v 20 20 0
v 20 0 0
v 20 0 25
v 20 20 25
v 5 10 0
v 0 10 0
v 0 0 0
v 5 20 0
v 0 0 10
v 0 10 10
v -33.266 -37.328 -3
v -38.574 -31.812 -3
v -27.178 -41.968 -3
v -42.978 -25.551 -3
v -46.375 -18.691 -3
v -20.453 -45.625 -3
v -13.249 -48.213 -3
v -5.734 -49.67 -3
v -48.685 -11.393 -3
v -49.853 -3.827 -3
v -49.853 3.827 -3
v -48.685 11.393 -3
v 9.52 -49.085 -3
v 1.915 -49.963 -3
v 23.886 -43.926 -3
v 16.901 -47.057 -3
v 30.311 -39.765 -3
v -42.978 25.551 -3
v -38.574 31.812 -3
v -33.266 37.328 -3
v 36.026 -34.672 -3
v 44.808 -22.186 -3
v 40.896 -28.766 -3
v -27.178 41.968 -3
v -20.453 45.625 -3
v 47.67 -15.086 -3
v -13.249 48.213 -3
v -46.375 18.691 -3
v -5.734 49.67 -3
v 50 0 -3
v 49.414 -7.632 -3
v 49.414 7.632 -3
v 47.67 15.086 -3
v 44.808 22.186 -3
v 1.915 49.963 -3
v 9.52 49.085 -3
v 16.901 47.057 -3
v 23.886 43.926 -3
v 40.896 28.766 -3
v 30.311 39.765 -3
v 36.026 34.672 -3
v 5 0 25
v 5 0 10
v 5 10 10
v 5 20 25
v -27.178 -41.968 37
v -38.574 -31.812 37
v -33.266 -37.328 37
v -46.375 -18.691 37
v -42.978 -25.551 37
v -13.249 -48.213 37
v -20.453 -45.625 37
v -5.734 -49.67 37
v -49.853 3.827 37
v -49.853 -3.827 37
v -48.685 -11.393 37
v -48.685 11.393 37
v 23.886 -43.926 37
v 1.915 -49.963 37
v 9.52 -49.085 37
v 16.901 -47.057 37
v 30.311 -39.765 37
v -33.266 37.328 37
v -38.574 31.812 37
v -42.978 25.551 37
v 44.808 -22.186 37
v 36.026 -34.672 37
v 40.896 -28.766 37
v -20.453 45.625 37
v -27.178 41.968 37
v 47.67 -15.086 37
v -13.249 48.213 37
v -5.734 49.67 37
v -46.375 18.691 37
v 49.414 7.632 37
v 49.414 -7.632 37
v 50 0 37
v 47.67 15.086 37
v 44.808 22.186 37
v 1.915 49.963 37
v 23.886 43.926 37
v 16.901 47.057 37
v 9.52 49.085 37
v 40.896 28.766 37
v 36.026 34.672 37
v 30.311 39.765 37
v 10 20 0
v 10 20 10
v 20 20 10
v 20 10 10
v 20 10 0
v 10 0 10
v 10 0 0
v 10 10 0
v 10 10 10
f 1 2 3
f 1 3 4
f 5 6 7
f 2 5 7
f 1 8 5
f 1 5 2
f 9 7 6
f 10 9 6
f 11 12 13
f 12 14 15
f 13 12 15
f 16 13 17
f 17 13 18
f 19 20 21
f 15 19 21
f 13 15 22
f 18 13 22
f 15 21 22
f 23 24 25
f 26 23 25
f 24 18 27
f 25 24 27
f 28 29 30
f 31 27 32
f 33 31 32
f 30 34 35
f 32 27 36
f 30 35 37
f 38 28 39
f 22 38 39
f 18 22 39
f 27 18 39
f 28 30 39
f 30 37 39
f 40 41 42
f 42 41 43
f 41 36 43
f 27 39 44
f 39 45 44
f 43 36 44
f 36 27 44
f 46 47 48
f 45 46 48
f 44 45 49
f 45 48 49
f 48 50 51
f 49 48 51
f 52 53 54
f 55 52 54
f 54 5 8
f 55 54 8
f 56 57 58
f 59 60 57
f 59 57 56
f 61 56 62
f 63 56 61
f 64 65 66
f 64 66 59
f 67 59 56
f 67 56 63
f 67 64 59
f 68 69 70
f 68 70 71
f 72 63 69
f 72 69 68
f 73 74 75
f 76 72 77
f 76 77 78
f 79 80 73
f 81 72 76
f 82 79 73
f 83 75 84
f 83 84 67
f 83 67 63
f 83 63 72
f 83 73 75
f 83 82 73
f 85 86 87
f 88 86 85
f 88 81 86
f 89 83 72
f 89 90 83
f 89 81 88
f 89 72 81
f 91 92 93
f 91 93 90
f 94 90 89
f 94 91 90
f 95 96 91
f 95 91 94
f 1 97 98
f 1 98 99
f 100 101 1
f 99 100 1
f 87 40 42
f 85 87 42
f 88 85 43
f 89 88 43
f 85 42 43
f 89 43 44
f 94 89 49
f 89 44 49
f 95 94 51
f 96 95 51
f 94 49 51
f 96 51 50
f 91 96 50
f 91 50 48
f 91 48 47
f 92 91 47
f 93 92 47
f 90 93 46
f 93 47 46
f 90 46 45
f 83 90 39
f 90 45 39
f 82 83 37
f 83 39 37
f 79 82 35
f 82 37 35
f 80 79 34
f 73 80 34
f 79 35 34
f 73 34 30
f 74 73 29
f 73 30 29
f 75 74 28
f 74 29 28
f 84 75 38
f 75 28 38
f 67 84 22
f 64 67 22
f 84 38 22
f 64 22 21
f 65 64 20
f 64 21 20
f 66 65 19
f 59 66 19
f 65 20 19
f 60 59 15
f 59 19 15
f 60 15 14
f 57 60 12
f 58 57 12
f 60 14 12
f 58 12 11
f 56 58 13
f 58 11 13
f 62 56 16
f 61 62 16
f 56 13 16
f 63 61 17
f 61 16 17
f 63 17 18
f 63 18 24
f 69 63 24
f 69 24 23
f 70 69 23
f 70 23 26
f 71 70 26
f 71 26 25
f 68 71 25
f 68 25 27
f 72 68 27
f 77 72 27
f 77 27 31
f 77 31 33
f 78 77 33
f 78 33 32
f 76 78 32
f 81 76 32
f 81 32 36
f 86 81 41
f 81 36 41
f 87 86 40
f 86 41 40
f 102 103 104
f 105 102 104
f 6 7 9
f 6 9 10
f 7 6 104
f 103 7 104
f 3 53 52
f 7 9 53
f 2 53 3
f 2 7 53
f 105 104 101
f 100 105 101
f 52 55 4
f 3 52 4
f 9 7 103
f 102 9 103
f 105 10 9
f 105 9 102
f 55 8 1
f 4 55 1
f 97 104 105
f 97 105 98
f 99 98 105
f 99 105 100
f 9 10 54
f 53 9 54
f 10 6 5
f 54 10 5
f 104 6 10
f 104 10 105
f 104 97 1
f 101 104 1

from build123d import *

# Parameters (mm, degrees)
BOX001_W       = 15
BOX001_H       = 20
BOX001_DEPTH   = 25
BOX_W          = 10
BOX_H          = 10
BOX_DEPTH      = 10
CYLINDER_R     = 50
CYLINDER_DEPTH = 40
BOX003_W       = 10
BOX003_H       = 10
BOX003_DEPTH   = 10
BOX002_W       = 10
BOX002_H       = 10
BOX002_DEPTH   = 10


with BuildPart() as cube001:
    # Box001 → Box001 (new body)
    with BuildSketch(Plane(origin=(5, 0, 0), x_dir=(1, 0, 0), z_dir=(0, 0, 1))):
        with Locations((7.5, 10)):
            Rectangle(BOX001_W, BOX001_H)
    extrude(amount=BOX001_DEPTH)


with BuildPart() as fusion:
    # Box → Box (new body)
    with BuildSketch(Plane.XY):
        with Locations((5, 5)):
            Rectangle(BOX_W, BOX_H)
    extrude(amount=BOX_DEPTH)

    # Fusion: union Cube001
    add(cube001.part)


with BuildPart() as cut:
    # Cylinder → Cylinder (new body)
    with BuildSketch(Plane.XY.offset(-3)):
        Circle(CYLINDER_R)
    extrude(amount=CYLINDER_DEPTH)

    # Cut: cut Fusion
    add(fusion.part, mode=Mode.SUBTRACT)


with BuildPart() as cube003:
    # Box003 → Box003 (new body)
    with BuildSketch(Plane(origin=(10, 10, 0), x_dir=(1, 0, 0), z_dir=(0, 0, 1))):
        with Locations((5, 5)):
            Rectangle(BOX003_W, BOX003_H)
    extrude(amount=BOX003_DEPTH)


with BuildPart() as fusion001:
    # Box002 → Box002 (new body)
    with BuildSketch(Plane.XY):
        with Locations((5, 5)):
            Rectangle(BOX002_W, BOX002_H)
    extrude(amount=BOX002_DEPTH)

    # Fusion001: union Cube003
    add(cube003.part)


solid = Compound([cut.part, fusion001.part])
